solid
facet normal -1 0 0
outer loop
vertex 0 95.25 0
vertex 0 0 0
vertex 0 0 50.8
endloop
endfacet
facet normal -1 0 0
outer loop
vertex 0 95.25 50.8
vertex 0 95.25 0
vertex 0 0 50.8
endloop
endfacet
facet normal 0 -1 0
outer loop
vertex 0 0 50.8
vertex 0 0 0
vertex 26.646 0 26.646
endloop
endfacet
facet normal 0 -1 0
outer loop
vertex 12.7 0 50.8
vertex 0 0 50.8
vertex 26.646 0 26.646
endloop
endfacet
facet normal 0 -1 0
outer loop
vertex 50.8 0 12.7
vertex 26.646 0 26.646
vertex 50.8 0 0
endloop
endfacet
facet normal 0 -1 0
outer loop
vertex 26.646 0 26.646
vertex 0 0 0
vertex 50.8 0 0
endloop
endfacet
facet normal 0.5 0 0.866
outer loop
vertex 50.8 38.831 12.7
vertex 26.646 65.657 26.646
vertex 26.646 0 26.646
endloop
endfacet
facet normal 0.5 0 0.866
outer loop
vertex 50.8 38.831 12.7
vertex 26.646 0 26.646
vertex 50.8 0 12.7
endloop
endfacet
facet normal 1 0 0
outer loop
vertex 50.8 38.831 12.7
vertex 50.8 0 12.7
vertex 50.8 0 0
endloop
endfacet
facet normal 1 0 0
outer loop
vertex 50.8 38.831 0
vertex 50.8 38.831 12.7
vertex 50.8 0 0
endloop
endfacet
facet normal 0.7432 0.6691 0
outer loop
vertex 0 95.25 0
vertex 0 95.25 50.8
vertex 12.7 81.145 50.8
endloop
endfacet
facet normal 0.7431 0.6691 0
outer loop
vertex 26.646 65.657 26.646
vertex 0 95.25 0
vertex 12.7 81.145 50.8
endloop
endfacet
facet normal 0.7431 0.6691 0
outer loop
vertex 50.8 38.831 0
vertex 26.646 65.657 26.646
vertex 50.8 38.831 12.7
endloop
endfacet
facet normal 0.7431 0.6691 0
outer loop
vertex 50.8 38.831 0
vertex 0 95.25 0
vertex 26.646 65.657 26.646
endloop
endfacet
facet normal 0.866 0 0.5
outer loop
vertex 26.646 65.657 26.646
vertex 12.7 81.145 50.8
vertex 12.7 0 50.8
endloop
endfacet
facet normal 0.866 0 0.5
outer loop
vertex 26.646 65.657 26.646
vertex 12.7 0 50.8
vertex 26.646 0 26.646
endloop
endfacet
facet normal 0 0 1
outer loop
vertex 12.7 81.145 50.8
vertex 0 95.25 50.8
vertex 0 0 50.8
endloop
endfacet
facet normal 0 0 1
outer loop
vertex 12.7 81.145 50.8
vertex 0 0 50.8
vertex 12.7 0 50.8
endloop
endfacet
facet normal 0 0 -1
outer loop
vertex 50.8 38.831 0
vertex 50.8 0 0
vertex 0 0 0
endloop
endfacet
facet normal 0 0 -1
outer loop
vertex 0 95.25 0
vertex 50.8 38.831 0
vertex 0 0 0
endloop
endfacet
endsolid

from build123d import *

# Parameters (mm, degrees)
BOSS_EXTRUDE1_DEPTH     = 95.25
CUT_EXTRUDE1_DEPTH      = 120.305668348
CUT_EXTRUDE1_DEPTH_BACK = 120.305668348


with BuildPart() as part:
    # Sketch1 → Boss-Extrude1 (new body)
    with BuildSketch(Plane(origin=(0, 0, 0), x_dir=(1, 0, 0), z_dir=(0, 1, 0))):
        Polygon((50.8, 0), (0, 0), (0, -50.8), (12.7, -50.8), (26.645567884, -26.645567884), (50.8, -12.7), align=None)
    extrude(amount=BOSS_EXTRUDE1_DEPTH)

    # Sketch2 → Cut-Extrude1 (cut, two sides: drawn at the far end of the back side and taken through both)
    with BuildSketch(Plane.XY.offset(-CUT_EXTRUDE1_DEPTH_BACK)):
        Polygon((-151.156603976, 263.126416075), (0, 95.25), (50.8, 38.830884247), (201.956603976, -129.045531829), (537.709436127, 173.267676124), (184.596228174, 565.439624028), align=None)
    extrude(amount=CUT_EXTRUDE1_DEPTH + CUT_EXTRUDE1_DEPTH_BACK, mode=Mode.SUBTRACT)


solid = part.part
